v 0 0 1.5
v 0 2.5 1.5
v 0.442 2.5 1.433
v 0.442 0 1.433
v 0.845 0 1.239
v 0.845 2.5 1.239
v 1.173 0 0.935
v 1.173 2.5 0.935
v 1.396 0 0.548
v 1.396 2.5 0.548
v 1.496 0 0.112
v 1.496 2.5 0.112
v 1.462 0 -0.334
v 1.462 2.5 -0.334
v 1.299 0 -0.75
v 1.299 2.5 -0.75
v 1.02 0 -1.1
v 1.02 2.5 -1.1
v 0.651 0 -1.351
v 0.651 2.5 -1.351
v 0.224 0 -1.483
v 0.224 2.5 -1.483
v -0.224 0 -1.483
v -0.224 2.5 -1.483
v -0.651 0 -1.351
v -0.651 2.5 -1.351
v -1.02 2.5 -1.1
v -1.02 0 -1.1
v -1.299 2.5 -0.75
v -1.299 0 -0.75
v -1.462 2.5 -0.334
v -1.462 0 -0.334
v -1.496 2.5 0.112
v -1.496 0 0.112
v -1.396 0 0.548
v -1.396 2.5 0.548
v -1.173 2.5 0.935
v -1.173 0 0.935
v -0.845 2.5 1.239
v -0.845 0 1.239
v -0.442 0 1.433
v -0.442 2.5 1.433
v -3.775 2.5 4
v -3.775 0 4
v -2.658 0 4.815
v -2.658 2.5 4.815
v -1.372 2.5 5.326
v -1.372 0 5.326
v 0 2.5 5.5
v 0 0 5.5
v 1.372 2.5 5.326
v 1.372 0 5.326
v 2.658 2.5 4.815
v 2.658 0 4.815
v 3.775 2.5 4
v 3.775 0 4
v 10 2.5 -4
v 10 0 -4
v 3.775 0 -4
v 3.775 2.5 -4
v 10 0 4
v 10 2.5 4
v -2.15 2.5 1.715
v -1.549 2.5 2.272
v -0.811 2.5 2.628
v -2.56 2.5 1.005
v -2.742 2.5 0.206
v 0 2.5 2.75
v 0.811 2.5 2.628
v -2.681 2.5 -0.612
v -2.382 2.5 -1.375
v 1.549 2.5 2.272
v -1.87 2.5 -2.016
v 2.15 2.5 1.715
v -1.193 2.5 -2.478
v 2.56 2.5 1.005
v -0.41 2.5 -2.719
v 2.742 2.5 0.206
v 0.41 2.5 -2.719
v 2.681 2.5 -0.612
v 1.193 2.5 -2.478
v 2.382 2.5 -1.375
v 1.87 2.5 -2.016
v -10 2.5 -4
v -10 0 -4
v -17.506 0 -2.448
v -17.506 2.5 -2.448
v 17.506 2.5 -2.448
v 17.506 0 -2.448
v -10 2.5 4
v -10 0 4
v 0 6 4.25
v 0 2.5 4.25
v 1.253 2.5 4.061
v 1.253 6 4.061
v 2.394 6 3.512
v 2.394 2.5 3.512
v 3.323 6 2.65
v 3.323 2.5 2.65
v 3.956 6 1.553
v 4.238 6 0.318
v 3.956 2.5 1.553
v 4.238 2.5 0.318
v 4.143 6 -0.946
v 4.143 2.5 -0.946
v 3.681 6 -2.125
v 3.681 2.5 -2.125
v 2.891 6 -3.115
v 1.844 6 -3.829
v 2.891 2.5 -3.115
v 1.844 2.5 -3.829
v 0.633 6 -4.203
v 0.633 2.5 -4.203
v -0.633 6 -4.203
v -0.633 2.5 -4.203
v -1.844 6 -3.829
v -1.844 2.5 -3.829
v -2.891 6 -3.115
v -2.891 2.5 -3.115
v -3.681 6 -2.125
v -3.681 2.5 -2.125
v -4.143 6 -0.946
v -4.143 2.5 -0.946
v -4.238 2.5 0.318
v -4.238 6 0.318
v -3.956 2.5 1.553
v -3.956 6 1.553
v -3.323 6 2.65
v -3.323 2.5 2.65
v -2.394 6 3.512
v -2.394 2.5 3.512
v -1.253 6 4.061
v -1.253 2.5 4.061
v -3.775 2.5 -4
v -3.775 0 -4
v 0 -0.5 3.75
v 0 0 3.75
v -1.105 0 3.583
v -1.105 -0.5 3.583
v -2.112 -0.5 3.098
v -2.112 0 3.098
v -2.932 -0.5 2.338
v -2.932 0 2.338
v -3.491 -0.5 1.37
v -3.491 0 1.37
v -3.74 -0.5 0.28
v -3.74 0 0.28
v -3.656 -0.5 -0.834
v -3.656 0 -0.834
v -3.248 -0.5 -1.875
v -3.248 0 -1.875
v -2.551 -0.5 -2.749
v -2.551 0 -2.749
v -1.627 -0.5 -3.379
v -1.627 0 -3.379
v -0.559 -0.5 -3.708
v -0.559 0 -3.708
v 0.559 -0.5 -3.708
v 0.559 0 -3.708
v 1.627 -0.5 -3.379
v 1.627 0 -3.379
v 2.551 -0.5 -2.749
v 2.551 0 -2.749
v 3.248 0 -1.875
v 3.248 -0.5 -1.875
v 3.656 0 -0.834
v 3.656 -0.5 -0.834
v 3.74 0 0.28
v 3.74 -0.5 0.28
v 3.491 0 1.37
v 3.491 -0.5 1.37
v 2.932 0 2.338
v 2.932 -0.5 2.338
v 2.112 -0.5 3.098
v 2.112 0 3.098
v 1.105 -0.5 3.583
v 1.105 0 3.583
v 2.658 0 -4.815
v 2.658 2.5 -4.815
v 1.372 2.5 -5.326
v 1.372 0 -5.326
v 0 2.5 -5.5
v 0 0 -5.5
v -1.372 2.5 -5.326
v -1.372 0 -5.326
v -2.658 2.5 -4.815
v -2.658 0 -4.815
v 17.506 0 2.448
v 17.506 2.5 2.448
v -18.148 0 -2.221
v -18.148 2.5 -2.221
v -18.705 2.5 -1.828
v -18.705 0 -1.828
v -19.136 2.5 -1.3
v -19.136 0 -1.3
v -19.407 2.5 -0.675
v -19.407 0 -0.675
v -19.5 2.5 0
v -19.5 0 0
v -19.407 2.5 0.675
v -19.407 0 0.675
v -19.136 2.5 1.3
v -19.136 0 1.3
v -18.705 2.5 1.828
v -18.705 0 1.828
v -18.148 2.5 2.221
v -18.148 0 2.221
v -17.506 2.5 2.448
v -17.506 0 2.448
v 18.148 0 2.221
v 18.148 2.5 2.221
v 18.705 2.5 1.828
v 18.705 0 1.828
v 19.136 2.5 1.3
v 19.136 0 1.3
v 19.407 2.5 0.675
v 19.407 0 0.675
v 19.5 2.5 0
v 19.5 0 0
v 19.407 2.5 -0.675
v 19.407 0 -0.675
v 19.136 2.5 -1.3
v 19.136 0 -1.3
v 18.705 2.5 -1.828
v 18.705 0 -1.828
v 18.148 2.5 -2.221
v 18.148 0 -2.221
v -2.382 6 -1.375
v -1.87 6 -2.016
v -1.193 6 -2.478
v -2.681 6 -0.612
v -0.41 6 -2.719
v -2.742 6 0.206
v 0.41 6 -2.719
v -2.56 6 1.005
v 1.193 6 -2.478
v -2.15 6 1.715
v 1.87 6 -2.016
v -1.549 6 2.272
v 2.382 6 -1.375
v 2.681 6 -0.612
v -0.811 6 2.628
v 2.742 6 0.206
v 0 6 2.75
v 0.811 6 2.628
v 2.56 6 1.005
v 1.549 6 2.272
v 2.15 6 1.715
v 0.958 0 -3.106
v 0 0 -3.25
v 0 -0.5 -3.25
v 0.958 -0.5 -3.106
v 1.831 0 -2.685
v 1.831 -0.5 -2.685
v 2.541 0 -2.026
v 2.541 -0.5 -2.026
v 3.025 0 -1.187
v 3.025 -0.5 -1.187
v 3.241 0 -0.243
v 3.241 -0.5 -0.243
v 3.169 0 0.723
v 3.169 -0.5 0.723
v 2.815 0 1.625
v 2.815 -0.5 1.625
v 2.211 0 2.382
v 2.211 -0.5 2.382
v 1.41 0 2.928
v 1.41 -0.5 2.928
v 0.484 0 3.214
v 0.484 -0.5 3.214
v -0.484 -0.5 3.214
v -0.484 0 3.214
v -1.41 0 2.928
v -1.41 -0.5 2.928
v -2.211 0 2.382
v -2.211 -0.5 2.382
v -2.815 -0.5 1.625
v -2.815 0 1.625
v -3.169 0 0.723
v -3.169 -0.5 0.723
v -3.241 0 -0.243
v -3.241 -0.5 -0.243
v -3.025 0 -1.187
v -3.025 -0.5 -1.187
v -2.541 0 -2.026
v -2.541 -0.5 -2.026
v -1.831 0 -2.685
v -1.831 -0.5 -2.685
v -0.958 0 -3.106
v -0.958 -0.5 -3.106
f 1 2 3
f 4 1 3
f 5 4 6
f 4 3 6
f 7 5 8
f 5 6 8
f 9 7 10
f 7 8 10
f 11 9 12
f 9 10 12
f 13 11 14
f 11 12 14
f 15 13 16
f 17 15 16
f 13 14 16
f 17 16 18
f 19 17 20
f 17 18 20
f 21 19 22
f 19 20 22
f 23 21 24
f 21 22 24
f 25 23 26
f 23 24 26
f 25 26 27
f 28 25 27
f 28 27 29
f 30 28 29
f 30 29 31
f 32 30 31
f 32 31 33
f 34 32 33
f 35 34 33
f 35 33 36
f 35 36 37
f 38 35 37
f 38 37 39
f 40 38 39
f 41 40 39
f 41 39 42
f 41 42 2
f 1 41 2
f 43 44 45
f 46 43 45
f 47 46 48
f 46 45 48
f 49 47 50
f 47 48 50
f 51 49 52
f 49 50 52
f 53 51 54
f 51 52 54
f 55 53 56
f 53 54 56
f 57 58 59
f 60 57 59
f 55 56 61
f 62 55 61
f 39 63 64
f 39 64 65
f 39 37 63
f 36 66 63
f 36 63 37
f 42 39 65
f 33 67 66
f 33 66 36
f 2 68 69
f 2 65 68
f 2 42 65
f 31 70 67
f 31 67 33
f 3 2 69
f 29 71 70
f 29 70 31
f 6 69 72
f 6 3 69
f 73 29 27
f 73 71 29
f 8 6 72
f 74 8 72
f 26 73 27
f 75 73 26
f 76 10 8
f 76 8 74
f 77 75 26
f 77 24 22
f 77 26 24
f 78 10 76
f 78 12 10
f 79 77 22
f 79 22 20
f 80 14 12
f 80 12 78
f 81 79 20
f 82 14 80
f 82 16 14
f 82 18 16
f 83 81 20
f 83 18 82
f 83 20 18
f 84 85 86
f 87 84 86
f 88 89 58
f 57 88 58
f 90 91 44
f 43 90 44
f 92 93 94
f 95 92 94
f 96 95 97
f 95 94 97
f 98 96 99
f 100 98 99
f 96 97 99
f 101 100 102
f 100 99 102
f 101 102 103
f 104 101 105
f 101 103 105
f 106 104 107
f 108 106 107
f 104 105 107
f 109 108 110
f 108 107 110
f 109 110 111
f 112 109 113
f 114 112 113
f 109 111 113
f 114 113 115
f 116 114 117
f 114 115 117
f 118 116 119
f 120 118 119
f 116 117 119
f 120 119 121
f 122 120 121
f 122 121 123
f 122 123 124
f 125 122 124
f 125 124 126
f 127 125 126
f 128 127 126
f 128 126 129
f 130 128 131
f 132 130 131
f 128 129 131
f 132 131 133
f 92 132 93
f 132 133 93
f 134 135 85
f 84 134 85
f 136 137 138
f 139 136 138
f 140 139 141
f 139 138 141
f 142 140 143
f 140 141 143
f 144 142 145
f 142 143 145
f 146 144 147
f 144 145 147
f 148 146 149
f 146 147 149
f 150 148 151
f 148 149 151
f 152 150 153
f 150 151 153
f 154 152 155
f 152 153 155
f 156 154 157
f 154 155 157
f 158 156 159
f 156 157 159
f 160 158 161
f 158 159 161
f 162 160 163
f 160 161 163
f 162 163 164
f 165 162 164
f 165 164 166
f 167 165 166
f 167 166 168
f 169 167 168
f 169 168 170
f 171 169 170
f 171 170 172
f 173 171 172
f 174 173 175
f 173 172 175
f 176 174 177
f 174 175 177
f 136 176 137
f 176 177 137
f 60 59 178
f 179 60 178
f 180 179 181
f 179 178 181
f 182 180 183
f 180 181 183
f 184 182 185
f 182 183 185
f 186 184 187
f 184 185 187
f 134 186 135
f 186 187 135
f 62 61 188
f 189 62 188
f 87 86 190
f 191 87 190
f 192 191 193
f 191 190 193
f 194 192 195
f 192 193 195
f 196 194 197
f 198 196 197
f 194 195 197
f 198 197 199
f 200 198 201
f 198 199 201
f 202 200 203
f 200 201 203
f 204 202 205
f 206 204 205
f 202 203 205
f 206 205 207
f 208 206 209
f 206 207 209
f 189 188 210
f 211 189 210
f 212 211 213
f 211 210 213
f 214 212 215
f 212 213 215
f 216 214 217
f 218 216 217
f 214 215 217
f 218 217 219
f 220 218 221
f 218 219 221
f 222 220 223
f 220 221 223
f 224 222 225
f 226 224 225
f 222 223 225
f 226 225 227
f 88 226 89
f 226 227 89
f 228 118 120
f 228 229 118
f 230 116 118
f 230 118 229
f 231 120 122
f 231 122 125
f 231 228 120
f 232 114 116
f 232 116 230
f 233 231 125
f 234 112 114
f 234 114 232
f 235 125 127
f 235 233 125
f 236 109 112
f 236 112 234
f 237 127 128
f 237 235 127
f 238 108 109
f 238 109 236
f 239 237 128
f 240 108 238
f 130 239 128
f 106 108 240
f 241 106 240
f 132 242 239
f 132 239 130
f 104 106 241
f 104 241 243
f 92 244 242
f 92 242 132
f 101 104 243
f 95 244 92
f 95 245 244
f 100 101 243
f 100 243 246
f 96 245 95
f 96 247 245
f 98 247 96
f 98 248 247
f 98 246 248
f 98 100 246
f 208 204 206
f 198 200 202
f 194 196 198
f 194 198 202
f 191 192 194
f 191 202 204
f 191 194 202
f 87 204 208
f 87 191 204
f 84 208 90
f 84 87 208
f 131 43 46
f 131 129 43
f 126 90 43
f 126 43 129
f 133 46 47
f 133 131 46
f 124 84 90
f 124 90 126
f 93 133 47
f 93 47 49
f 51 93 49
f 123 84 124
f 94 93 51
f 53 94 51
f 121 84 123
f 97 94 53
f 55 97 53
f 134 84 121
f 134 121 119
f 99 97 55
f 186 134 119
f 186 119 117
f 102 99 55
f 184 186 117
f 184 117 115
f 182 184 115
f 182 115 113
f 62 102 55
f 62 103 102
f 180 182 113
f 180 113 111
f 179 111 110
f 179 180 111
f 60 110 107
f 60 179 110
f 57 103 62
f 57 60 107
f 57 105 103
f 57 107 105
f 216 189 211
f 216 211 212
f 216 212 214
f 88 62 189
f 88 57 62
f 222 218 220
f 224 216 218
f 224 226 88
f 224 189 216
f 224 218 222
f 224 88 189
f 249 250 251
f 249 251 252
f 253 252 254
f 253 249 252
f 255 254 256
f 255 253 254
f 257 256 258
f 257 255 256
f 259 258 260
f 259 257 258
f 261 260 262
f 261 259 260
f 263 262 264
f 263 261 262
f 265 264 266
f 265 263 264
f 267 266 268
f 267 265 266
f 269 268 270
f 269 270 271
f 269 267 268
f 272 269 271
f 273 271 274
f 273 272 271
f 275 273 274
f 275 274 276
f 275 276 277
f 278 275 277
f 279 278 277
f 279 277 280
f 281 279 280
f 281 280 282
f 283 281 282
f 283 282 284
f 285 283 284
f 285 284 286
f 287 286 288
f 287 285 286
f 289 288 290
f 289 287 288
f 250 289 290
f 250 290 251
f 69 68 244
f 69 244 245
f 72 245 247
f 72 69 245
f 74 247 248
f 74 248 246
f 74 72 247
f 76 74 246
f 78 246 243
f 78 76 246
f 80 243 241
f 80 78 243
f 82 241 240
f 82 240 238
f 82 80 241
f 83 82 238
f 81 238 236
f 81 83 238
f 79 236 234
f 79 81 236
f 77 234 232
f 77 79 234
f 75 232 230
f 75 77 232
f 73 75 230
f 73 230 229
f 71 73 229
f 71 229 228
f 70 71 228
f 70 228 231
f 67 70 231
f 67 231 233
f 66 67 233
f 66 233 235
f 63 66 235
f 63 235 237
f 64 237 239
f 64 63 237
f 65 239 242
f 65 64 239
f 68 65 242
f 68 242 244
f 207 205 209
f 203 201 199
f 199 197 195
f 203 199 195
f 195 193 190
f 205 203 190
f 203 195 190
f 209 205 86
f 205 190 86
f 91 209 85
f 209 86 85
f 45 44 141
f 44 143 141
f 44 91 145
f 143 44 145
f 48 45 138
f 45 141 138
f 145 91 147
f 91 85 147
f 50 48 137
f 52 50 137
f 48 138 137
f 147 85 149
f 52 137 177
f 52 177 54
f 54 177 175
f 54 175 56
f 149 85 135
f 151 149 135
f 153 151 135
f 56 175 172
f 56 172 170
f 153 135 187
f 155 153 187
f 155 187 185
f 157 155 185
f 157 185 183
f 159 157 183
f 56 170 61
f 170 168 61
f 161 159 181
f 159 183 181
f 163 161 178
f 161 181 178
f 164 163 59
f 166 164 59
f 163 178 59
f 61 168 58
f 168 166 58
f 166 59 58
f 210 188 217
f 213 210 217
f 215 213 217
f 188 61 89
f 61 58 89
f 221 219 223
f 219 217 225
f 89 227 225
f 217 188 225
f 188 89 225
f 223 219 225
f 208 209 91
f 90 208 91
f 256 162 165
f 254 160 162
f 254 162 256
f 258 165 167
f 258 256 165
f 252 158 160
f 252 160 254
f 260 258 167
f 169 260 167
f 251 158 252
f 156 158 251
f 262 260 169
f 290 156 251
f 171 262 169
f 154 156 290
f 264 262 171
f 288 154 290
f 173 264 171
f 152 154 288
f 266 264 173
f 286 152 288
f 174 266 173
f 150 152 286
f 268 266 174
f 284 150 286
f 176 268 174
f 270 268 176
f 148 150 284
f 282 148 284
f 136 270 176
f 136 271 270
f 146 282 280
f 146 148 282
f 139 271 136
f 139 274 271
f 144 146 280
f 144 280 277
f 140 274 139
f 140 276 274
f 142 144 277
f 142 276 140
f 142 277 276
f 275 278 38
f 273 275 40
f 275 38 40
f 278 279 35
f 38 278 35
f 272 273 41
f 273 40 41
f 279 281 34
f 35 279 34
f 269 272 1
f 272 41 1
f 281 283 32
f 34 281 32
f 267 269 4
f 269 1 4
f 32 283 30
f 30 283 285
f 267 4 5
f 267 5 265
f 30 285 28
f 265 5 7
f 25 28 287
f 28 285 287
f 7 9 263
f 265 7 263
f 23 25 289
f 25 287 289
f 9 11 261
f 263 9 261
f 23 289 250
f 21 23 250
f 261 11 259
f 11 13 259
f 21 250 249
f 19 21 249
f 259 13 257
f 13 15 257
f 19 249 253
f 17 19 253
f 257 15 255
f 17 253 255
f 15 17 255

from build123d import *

# Parameters (mm, degrees)
BOSS_EXTRUDE1_DEPTH = 2.5
SKETCH2_R           = 1.5
CUT_EXTRUDE1_DEPTH  = 10
SKETCH3_R           = 4.25
SKETCH3_R_2         = 2.75
BOSS_EXTRUDE2_DEPTH = 3.5
SKETCH4_R           = 3.75
SKETCH4_R_2         = 3.25
BOSS_EXTRUDE3_DEPTH = 0.5


with BuildPart() as part:
    # Sketch1 → Boss-Extrude1 (new body)
    with BuildSketch(Plane(origin=(0, 0, 0), x_dir=(1, 0, 0), z_dir=(0, 1, 0))):
        with BuildLine():
            Line((10, -4), (17.506131517, -2.448230154))
            ThreePointArc((17.506131517, -2.448230154), (19.5, 0), (17.506131517, 2.448230154))
            Line((17.506131517, 2.448230154), (10, 4))
            Line((10, 4), (3.774917218, 4))
            ThreePointArc((3.774917218, 4), (0, 5.5), (-3.774917218, 4))
            Line((-3.774917218, 4), (-10, 4))
            Line((-10, 4), (-17.506131517, 2.448230154))
            ThreePointArc((-17.506131517, 2.448230154), (-19.5, 0), (-17.506131517, -2.448230154))
            Line((-17.506131517, -2.448230154), (-10, -4))
            Line((-10, -4), (-3.774917218, -4))
            ThreePointArc((-3.774917218, -4), (0, -5.5), (3.774917218, -4))
            Line((3.774917218, -4), (10, -4))
        make_face()
    extrude(amount=BOSS_EXTRUDE1_DEPTH)

    # Sketch2 → Cut-Extrude1 (cut)
    with BuildSketch(Plane(origin=(0, 2.5, 0), x_dir=(1, 0, 0), z_dir=(0, 1, 0))):
        with Locations(Location((0, 0, 0), (0, 0, 270))):
            Circle(SKETCH2_R)
    extrude(amount=-CUT_EXTRUDE1_DEPTH, mode=Mode.SUBTRACT)

    # Sketch3 → Boss-Extrude2 (add)
    with BuildSketch(Plane(origin=(0, 2.5, 0), x_dir=(1, 0, 0), z_dir=(0, 1, 0))):
        with Locations(Location((0, 0, 0), (0, 0, 270))):
            Circle(SKETCH3_R)
        with Locations(Location((0, 0, 0), (0, 0, 270))):
            Circle(SKETCH3_R_2, mode=Mode.SUBTRACT)
    extrude(amount=BOSS_EXTRUDE2_DEPTH)

    # Sketch4 → Boss-Extrude3 (add)
    with BuildSketch(Plane.XZ):
        with Locations(Location((0, 0, 0), (0, 0, 90))):
            Circle(SKETCH4_R)
        with Locations(Location((0, 0, 0), (0, 0, 270))):
            Circle(SKETCH4_R_2, mode=Mode.SUBTRACT)
    extrude(amount=BOSS_EXTRUDE3_DEPTH)


solid = part.part
